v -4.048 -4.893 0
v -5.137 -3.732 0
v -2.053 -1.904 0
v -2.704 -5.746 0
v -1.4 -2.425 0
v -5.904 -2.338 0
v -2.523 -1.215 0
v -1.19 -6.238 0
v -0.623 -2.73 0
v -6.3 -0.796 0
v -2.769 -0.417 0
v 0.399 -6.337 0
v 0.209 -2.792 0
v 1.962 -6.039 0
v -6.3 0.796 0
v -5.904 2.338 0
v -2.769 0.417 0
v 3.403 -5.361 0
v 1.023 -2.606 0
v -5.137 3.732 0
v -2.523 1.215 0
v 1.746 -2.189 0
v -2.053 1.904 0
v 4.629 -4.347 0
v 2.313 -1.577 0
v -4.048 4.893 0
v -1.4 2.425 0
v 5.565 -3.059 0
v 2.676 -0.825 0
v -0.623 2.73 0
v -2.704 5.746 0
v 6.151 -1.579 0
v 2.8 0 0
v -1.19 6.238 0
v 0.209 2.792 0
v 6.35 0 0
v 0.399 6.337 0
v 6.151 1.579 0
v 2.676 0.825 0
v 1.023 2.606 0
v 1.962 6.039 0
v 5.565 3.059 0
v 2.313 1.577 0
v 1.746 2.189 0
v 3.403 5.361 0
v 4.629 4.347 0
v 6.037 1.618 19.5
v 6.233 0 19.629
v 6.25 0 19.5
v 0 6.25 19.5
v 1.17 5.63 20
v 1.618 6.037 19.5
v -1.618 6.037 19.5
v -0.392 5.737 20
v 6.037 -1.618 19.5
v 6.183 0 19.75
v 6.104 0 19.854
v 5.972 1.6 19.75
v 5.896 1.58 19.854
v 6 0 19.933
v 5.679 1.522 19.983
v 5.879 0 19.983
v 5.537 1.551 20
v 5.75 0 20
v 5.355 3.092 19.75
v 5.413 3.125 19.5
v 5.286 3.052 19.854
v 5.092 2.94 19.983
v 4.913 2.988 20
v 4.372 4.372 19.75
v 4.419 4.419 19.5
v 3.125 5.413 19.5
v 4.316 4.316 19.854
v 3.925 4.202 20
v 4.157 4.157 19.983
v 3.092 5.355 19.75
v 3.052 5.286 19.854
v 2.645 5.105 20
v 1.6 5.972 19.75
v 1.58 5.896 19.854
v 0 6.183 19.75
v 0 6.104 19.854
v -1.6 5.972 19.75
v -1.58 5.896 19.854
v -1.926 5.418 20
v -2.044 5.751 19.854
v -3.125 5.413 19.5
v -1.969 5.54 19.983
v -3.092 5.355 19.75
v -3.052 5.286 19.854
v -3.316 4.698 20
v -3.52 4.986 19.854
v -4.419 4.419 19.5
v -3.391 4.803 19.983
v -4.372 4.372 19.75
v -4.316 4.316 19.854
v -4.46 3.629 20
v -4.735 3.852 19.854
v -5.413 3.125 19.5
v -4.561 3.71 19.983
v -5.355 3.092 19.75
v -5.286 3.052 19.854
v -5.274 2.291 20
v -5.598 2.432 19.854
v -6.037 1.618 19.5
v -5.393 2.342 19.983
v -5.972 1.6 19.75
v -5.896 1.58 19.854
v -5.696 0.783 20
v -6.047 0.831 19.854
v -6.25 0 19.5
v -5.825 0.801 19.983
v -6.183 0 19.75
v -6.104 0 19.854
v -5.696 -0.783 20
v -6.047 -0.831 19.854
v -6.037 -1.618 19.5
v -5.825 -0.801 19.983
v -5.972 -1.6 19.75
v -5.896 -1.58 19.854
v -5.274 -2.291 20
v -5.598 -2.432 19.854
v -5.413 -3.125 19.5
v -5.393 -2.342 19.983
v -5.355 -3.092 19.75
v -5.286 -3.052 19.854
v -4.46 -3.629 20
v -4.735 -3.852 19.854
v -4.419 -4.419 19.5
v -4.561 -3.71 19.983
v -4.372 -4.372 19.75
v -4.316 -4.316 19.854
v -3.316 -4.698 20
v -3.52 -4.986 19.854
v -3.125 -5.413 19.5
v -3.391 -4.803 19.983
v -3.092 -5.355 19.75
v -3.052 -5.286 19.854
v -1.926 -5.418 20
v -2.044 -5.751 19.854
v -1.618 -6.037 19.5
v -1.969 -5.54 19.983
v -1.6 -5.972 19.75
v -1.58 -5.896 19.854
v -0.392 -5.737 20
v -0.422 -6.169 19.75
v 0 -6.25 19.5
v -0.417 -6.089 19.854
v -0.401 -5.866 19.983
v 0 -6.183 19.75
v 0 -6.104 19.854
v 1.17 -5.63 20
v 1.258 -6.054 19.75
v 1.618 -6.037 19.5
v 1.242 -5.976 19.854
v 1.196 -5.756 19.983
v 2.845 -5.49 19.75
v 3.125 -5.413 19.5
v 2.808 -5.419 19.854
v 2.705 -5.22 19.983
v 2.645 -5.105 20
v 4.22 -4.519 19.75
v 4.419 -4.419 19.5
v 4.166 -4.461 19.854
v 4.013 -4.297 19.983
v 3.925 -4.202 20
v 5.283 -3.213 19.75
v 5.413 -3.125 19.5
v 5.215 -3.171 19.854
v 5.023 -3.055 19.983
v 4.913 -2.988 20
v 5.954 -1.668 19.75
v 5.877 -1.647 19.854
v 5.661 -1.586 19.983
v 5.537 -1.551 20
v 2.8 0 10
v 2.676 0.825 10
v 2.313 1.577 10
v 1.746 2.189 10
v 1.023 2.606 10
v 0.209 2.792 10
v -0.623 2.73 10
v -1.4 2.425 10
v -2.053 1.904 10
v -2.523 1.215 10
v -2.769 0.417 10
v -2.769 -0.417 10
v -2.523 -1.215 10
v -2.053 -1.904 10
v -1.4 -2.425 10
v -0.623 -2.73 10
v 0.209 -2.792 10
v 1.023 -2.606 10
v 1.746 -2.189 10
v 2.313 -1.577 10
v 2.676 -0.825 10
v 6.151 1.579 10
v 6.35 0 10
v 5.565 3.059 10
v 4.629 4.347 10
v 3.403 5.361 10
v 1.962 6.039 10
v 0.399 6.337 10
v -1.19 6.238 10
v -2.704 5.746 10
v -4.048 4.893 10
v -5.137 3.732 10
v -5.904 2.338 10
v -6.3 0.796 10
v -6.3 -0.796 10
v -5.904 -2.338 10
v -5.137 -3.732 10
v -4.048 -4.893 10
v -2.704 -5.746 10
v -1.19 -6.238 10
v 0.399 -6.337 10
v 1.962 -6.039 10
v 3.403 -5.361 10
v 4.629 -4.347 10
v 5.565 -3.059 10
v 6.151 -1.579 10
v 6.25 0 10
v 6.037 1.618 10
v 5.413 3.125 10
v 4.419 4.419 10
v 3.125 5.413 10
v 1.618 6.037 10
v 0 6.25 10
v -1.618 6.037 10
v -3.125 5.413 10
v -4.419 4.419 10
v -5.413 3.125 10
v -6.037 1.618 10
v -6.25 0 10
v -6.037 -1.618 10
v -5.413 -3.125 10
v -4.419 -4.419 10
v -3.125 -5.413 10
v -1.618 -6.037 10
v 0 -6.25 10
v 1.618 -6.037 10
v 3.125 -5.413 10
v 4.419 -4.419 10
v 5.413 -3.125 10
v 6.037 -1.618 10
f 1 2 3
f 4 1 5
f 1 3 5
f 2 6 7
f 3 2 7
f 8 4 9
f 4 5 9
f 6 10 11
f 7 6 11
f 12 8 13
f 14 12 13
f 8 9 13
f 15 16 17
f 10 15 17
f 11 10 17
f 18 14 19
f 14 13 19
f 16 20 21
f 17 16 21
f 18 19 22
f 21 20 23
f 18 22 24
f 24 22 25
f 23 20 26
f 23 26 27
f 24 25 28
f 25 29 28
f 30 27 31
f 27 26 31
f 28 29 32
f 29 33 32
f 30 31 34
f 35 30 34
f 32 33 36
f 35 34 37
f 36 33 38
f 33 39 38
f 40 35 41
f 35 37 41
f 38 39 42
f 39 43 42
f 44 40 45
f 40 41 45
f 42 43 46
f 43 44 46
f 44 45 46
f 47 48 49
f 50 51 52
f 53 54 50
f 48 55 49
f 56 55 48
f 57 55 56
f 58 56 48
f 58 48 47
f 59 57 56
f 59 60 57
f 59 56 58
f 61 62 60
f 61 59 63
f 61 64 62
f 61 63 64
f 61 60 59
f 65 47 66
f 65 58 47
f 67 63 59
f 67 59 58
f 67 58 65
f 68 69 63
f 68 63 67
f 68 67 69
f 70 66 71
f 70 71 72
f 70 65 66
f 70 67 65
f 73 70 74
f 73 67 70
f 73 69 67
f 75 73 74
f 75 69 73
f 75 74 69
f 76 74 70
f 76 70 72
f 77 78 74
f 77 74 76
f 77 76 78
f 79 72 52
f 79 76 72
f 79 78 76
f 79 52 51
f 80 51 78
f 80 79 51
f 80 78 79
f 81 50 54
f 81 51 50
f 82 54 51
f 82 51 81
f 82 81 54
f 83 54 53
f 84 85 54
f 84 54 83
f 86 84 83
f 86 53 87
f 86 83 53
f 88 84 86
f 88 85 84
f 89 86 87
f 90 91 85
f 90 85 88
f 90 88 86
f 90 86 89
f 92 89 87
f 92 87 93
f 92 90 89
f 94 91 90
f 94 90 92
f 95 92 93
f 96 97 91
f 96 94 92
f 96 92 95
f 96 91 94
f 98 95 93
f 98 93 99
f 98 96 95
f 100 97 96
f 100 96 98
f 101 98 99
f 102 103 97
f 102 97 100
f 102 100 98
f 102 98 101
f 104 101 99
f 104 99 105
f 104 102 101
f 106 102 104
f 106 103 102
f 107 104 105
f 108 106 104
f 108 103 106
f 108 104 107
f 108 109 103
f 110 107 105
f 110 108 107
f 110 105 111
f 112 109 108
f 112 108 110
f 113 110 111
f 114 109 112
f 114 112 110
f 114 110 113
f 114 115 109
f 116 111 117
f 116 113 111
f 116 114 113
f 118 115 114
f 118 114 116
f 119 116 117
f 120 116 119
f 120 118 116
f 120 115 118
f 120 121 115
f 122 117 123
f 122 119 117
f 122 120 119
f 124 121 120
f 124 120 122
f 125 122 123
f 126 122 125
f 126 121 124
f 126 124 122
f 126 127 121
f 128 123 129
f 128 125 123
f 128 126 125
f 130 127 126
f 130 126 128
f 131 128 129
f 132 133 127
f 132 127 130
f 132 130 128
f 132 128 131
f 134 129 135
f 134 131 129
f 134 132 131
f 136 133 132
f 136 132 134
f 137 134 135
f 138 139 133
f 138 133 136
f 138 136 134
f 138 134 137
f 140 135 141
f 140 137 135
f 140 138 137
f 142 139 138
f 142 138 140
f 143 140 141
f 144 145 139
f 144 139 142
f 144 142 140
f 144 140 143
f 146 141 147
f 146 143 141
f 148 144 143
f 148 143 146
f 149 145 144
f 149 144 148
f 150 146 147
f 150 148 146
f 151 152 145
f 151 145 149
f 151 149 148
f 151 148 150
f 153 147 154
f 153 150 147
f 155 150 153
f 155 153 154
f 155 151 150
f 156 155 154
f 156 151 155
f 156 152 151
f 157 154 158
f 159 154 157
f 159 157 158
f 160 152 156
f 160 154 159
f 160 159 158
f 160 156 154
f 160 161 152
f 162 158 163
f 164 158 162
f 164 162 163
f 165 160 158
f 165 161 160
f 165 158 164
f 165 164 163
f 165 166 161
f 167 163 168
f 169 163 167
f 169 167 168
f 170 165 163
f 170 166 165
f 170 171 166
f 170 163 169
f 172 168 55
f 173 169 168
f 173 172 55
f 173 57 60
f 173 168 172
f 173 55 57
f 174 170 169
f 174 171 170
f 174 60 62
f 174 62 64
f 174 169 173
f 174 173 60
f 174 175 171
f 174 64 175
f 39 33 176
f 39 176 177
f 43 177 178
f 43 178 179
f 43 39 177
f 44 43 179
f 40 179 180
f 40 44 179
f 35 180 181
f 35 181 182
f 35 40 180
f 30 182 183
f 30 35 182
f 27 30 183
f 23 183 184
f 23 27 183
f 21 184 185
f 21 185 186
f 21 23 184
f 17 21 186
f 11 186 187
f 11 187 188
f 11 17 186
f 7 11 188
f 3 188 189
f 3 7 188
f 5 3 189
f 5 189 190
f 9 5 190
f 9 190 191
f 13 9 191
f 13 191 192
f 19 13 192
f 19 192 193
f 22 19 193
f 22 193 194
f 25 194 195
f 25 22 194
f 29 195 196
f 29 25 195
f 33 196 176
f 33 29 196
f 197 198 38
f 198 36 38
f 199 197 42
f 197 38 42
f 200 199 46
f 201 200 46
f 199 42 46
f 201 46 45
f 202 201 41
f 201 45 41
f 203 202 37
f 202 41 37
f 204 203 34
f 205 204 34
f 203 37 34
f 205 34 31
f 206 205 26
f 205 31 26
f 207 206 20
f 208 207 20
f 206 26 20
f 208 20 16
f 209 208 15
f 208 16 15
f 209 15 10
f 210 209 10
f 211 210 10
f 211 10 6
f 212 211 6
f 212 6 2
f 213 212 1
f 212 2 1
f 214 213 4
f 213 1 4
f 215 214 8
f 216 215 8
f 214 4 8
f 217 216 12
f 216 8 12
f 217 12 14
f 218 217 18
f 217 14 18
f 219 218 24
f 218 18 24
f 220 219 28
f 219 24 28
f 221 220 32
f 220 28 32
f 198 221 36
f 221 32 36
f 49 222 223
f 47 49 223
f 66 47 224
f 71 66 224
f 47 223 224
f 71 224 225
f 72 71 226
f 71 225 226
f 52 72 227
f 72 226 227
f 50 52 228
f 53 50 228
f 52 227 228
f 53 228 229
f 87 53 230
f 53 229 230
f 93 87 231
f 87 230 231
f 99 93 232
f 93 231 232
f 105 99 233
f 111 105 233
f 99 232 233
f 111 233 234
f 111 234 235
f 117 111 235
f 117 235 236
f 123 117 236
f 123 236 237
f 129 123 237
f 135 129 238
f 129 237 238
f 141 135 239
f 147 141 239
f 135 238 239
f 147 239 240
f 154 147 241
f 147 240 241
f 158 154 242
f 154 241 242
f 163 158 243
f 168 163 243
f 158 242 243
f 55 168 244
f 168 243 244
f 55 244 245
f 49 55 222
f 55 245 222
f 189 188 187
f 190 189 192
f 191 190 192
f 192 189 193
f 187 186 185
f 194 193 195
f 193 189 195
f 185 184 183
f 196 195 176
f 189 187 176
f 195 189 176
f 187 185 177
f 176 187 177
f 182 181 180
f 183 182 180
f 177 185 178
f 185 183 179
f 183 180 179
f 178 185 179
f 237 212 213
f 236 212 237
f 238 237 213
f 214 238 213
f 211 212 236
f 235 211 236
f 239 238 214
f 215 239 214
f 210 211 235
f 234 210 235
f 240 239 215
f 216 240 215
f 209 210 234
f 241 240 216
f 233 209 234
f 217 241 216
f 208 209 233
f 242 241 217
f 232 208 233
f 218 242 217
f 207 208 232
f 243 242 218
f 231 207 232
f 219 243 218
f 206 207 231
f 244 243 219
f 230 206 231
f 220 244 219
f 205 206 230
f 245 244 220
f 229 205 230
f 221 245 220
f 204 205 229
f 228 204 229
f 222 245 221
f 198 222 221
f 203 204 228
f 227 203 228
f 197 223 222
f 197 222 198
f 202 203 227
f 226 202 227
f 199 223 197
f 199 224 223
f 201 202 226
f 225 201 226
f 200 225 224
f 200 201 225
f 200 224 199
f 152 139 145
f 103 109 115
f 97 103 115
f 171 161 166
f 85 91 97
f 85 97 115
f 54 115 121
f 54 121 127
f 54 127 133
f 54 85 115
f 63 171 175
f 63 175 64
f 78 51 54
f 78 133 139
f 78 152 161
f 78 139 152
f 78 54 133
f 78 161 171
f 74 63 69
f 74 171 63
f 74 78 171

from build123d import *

# Parameters (mm, degrees)
SKETCH1_R           = 6.35
SKETCH1_R_2         = 2.8
BOSS_EXTRUDE2_DEPTH = 10
SKETCH2_R           = 6.35
BOSS_EXTRUDE3_DEPTH = 10
CUT_EXTRUDE1_START  = -10
SKETCH3_R           = 6.35
SKETCH3_R_2         = 6.25
CUT_EXTRUDE1_DEPTH  = 10
FILLET1_R           = 0.5


with BuildPart() as part:
    # Sketch1 → Boss-Extrude2 (new body)
    with BuildSketch(Plane.XY):
        Circle(SKETCH1_R)
        Circle(SKETCH1_R_2, mode=Mode.SUBTRACT)
    extrude(amount=BOSS_EXTRUDE2_DEPTH)

    # Sketch2 → Boss-Extrude3 (add)
    with BuildSketch(Plane.XY.offset(10)):
        Circle(SKETCH2_R)
    extrude(amount=BOSS_EXTRUDE3_DEPTH)

    # Sketch3 → Cut-Extrude1 (cut)
    with BuildSketch(Plane.XY.offset(20).offset(CUT_EXTRUDE1_START)):
        Circle(SKETCH3_R)
        Circle(SKETCH3_R_2, mode=Mode.SUBTRACT)
    extrude(amount=CUT_EXTRUDE1_DEPTH, mode=Mode.SUBTRACT)

    # Fillet1
    fillet1_edges = [part.edges().sort_by_distance(p)[0] for p in [
        (-6.25, 0, 20),
    ]]
    fillet(fillet1_edges, radius=FILLET1_R)


solid = part.part
